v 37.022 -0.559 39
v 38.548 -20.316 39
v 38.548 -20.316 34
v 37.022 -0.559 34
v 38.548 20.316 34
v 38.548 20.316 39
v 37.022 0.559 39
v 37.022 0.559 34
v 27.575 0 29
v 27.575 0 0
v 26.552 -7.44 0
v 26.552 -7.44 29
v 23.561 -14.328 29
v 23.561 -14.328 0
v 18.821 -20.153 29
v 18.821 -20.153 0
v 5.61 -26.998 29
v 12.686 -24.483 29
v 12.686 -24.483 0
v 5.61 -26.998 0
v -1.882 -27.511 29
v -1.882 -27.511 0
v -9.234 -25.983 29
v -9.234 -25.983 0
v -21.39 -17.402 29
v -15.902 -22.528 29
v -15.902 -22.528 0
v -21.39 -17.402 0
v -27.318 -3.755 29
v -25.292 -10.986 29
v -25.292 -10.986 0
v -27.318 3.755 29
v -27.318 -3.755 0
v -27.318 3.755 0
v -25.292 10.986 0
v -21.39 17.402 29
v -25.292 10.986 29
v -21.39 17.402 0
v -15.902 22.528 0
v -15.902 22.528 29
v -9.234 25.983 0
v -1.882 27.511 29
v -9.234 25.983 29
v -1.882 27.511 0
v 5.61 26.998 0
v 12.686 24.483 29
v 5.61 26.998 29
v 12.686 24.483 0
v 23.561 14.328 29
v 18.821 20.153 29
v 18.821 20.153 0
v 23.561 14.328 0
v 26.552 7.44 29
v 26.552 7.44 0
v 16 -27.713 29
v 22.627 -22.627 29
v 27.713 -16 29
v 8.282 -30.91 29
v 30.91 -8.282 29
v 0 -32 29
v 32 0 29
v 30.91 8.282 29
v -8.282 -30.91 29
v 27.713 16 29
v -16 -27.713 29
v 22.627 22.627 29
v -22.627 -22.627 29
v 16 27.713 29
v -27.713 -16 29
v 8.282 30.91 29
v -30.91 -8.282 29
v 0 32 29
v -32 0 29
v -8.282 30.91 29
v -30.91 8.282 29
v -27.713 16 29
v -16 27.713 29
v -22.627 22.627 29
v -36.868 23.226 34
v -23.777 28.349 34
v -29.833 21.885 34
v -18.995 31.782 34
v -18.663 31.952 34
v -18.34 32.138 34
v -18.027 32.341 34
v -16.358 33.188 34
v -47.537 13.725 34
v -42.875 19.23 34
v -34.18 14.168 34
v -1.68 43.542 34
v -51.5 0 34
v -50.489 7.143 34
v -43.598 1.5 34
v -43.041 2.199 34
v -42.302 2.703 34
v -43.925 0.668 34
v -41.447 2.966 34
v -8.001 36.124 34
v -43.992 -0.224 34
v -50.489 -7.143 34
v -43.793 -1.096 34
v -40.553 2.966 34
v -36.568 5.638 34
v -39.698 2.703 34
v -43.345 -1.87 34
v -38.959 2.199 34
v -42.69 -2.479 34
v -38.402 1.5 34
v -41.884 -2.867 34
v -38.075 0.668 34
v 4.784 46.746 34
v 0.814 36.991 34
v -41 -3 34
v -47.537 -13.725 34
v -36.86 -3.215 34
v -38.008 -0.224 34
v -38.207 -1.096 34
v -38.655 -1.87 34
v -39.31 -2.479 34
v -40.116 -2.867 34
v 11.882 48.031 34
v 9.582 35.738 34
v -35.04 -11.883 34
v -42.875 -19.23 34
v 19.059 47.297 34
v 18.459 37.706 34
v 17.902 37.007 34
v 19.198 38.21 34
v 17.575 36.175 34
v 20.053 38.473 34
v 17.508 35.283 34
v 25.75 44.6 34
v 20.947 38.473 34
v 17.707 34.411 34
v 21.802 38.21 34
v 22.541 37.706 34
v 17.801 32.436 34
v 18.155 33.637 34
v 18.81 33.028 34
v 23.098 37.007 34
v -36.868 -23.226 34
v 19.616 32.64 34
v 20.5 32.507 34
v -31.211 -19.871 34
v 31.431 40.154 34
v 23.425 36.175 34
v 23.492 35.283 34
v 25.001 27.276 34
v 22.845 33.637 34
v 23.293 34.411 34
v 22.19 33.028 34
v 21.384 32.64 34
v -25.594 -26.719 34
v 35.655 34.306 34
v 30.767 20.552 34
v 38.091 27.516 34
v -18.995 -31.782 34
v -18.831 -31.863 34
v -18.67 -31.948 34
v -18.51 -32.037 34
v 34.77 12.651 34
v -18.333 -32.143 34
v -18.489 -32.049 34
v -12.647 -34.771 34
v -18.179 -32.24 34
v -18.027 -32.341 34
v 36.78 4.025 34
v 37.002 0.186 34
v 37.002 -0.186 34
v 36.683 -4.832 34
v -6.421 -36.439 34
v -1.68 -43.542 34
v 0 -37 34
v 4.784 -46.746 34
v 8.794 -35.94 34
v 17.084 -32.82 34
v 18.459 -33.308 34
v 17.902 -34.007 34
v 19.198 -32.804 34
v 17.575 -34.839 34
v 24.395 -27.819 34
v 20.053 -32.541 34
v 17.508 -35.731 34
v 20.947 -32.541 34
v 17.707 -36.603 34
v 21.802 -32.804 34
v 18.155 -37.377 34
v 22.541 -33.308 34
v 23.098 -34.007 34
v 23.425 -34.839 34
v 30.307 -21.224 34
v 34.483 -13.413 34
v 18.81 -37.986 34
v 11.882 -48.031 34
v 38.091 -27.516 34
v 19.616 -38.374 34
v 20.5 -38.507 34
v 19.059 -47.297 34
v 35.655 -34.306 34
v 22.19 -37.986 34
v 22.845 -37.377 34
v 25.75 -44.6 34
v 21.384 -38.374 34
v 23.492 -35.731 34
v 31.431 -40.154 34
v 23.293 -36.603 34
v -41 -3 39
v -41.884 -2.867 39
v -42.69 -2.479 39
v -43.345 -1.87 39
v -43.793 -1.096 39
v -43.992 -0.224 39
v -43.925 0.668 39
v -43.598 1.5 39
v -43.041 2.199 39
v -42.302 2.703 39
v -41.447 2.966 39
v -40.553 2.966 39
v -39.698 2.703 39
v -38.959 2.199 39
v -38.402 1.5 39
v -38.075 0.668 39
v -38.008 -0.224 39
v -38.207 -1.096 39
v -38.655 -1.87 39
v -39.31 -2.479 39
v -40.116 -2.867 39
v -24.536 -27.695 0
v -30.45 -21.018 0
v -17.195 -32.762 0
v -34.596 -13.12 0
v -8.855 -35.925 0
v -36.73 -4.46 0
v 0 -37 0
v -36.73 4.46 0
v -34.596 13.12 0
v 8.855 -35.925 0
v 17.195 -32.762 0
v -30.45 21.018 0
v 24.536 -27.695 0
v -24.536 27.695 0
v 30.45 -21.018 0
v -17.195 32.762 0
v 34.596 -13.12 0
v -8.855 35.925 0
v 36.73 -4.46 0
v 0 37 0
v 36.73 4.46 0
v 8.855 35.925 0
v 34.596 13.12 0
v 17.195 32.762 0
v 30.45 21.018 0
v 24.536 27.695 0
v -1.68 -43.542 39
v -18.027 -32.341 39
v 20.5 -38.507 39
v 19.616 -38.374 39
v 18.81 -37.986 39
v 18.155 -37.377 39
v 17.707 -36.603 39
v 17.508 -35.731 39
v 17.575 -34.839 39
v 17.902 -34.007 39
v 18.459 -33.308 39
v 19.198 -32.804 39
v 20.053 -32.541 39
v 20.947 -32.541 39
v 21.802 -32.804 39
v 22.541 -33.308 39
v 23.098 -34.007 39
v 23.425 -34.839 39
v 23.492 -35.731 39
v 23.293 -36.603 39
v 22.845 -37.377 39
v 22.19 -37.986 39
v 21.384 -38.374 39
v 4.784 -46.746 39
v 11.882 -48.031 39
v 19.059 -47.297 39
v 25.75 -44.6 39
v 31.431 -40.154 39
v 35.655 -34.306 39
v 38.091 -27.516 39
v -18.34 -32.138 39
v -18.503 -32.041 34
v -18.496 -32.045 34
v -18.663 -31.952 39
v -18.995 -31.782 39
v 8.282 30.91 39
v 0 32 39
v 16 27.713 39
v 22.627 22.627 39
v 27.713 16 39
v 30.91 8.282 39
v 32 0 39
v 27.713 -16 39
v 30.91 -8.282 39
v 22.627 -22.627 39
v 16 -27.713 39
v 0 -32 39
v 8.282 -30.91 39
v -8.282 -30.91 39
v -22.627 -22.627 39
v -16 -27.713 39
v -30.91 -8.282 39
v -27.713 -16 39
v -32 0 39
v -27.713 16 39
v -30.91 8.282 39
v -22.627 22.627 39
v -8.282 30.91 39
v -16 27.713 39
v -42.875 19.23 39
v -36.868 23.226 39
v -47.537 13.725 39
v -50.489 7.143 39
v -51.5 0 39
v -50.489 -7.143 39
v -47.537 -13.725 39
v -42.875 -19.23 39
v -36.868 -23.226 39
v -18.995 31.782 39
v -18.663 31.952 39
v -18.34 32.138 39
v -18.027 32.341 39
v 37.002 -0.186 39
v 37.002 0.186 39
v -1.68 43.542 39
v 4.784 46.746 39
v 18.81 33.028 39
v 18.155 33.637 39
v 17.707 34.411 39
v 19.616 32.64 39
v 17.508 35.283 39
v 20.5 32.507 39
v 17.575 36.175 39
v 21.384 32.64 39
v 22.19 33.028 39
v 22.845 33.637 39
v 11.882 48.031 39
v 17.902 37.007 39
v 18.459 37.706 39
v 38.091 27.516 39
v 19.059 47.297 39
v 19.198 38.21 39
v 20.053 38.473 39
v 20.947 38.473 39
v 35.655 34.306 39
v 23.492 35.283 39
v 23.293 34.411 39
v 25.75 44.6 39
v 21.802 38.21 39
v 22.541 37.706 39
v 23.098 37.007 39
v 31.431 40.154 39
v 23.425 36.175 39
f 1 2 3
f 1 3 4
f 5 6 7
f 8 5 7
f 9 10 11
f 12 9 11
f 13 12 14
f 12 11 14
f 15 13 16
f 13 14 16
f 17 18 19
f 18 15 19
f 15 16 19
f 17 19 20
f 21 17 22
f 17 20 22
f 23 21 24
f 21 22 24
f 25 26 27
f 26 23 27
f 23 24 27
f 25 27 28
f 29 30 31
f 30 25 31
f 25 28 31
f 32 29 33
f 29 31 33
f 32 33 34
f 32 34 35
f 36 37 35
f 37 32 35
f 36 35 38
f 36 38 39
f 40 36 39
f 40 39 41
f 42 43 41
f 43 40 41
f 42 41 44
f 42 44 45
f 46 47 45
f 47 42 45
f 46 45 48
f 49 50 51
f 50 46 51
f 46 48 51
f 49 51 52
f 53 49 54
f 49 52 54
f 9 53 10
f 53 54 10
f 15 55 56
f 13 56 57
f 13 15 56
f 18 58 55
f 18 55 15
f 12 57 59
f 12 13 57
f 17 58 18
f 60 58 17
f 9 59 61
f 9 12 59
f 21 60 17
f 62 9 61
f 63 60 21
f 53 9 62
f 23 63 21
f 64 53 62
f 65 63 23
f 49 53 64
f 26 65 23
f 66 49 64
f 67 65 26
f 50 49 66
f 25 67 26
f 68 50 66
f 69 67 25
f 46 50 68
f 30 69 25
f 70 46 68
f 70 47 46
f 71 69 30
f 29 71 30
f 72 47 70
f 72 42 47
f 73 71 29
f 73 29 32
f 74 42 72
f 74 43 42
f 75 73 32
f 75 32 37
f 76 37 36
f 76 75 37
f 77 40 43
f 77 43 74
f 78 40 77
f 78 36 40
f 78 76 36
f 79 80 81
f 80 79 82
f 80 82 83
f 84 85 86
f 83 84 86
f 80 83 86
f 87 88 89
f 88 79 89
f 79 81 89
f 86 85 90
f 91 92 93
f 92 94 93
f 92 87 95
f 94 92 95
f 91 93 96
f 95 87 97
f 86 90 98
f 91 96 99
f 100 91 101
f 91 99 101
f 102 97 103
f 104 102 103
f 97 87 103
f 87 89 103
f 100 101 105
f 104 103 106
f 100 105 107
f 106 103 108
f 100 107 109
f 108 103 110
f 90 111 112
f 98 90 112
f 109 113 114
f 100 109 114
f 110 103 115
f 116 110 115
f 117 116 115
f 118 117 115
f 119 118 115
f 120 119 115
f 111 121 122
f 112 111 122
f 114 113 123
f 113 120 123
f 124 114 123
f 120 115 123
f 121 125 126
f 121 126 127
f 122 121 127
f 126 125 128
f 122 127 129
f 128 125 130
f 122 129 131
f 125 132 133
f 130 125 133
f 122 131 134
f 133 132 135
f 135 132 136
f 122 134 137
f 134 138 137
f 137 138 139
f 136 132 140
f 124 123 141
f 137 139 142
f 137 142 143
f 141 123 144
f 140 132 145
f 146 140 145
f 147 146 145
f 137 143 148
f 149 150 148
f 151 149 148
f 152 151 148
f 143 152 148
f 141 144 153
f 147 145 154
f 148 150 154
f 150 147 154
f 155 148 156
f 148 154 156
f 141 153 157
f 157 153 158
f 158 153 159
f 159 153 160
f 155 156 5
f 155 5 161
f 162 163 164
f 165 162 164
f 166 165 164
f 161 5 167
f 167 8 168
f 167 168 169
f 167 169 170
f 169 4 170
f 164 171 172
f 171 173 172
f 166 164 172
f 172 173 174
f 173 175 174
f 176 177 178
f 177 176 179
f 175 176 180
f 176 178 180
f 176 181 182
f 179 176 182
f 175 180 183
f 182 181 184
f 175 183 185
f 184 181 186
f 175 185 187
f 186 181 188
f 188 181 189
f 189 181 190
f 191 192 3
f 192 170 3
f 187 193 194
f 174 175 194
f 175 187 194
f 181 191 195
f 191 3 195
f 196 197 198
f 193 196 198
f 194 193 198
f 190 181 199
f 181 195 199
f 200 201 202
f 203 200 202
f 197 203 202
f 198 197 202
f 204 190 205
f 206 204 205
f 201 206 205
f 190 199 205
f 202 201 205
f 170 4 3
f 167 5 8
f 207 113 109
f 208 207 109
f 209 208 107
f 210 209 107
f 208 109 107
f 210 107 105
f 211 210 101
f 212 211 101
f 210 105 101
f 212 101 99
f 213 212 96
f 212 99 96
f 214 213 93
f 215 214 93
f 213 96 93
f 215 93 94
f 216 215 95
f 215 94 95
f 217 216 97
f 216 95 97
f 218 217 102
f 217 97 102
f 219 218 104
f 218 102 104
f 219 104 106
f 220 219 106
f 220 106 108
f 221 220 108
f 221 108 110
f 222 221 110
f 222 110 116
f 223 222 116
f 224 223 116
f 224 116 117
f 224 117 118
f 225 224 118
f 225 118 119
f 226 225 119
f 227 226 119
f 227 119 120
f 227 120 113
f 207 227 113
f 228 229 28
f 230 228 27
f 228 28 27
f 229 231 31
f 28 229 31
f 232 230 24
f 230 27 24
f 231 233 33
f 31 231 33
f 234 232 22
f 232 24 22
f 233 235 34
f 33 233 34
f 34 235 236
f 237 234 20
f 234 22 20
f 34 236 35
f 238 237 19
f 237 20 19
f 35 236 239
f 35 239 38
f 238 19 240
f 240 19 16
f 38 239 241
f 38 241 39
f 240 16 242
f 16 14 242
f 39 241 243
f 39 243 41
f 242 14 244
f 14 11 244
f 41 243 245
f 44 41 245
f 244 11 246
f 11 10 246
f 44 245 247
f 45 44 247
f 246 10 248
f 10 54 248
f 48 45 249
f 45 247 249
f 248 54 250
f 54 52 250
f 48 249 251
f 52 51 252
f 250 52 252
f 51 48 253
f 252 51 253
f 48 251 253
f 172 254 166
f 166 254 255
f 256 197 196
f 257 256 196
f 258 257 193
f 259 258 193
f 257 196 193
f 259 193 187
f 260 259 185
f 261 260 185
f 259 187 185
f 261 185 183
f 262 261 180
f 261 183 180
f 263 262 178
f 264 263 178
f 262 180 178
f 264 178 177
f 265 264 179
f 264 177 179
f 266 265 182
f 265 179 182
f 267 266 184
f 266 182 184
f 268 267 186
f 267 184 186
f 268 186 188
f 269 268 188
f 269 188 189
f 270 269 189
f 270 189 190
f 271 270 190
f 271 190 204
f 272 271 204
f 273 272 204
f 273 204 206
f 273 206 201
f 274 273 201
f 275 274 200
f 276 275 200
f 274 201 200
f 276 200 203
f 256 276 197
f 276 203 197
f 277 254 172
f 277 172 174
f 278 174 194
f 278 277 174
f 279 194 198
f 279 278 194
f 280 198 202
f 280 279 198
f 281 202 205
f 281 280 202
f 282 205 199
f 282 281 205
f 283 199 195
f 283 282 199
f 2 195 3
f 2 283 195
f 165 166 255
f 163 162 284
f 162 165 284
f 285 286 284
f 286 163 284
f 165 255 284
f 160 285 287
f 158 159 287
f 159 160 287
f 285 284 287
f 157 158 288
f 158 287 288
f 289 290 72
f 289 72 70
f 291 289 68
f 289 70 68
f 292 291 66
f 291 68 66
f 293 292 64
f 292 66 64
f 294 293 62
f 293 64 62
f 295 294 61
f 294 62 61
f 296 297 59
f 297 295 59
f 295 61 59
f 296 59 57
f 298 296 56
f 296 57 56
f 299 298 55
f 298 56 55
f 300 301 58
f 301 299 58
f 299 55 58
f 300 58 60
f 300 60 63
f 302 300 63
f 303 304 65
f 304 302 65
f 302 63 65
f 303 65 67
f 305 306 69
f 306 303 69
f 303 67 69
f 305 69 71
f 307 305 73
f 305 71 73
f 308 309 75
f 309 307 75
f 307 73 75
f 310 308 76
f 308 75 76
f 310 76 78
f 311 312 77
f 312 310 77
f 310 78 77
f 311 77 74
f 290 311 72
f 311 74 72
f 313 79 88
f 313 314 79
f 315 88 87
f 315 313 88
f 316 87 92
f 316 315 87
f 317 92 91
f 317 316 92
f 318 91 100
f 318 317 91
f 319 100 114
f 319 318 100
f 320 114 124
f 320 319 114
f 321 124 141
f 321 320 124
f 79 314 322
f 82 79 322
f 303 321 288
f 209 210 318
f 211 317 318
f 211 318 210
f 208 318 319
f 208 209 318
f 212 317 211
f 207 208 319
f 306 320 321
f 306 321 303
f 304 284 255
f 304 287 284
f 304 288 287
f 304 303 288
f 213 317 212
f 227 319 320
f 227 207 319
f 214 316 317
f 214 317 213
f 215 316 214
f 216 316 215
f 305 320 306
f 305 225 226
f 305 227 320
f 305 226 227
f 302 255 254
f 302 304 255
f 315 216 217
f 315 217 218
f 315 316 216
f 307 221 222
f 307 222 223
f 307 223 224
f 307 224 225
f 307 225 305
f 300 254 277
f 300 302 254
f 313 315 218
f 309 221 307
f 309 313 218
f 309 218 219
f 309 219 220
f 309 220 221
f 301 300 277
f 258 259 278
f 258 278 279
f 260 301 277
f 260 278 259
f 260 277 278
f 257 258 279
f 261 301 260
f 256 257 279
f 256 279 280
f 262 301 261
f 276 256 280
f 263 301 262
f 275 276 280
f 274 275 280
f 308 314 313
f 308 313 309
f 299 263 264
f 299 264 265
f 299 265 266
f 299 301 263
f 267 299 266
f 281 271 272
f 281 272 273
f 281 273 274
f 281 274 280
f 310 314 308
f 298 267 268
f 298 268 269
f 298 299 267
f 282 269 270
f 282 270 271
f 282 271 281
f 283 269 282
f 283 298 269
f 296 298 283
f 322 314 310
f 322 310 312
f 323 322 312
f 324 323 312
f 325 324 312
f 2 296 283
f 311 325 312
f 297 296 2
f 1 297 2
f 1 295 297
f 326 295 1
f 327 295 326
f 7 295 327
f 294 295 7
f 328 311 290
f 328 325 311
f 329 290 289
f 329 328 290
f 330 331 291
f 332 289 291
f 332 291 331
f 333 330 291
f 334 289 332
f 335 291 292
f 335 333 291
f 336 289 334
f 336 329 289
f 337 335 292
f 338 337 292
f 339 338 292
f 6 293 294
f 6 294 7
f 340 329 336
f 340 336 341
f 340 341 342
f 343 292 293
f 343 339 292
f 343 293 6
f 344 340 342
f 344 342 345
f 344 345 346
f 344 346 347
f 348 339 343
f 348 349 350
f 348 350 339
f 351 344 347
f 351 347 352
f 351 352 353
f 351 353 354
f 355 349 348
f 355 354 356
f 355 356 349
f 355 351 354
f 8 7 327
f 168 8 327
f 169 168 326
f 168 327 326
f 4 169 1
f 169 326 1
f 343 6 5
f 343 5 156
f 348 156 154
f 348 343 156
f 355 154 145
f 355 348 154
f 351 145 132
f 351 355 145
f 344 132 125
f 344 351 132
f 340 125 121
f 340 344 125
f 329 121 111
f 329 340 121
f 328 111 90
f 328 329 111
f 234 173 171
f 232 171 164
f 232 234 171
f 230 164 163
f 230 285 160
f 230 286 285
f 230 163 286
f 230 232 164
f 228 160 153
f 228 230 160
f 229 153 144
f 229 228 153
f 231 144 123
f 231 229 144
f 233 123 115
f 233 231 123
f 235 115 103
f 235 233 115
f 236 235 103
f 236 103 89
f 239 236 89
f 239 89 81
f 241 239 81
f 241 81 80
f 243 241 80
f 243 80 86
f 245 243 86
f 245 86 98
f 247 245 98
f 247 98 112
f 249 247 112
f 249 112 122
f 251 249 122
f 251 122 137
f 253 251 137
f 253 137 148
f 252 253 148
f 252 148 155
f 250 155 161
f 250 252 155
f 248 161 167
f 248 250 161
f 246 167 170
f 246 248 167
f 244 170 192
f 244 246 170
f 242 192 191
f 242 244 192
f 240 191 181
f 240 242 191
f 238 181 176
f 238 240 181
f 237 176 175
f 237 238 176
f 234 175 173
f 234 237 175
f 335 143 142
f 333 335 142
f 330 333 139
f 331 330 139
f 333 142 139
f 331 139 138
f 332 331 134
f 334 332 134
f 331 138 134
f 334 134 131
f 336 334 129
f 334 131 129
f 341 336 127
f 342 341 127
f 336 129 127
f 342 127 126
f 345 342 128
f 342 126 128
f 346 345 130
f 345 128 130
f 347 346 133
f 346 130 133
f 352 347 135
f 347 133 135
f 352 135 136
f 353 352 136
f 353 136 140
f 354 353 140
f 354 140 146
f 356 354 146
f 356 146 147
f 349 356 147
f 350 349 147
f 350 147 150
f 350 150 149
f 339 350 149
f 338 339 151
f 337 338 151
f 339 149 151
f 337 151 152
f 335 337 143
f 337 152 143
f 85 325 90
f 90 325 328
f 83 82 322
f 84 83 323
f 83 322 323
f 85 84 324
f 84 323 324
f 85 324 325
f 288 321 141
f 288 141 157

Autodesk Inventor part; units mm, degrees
ref_plane "XZ Plane" through (0, 0, 0) normal (0, 1, 0) x (-1, 0, 0)
ref_plane "XY Plane" through (0, 0, 0) normal (0, 0, 1) x (1, 0, 0)
sketch "Sketch1" plane through (0, 0, 0) normal (0, 0, 1) x (1, 0, 0)
  circle A0 centre (0, 0) radius 27.575
  circle A1 centre (0, 0) radius 51.5
  dimension "d0" = 55.15
  dimension "d1" = 103
extrude "Extrusion1" add sketch "Sketch1" along normal blind 39
sketch "Sketch2" plane through (0, 0, 0) normal (1, 0, 0) x (0, 1, 0)
  line L0 (51.5, 39) -> (-51.5, 39) projected
  line L1 (51.5, 0) -> (-51.5, 0) projected
  line L2 (42.7787, 29) -> (-54.5799, 29) construction
  line L3 (-27.575, 39) -> (27.575, 39) projected
  line L4 (-27.575, 39) -> (27.575, 39) projected
  line L5 (-27.575, 0) -> (27.575, 0) projected
  line L6 (51.5, 0) -> (27.575, 0) projected
  line L7 (27.575, 0) -> (27.575, 39) projected
  line L8 (27.575, 39) -> (51.5, 39) projected
  line L9 (-51.5, 39) -> (-27.575, 39) projected
  line L10 (-27.575, 39) -> (-27.575, 0) projected
  line L11 (-27.575, 0) -> (-51.5, 0) projected
  line L12 (27.575, 39) -> (32, 39)
  line L13 (32, 39) -> (32, 29)
  line L14 (32, 29) -> (27.575, 29)
  line L15 (27.575, 29) -> (27.575, 39)
  line L16 (0, -7.8) -> (0, 46.8) projected
  line L17 (51.5, 39) -> (51.5, 0) projected
  line L18 (-51.5, 0) -> (-51.5, 39) projected
  point P0 (0, 0)
  dimension "d4" = 10
  dimension "d5" = 32
revolve "Revolution1" cut sketch "Sketch2" angle 360 about axis through (0, 0, -10) along (0, 0, 1) contours L13 L14 L7 L0
sketch "Sketch3" plane through (0, 0, 0) normal (1, 0, 0) x (0, 1, 0)
  line L0 (51.5, 39) -> (51.5, 0) projected
  line L1 (51.5, 0) -> (27.575, 0) projected
  line L2 (27.575, 0) -> (27.575, 29) projected
  line L3 (27.575, 29) -> (32, 29) projected
  line L4 (32, 29) -> (32, 39) projected
  line L5 (32, 39) -> (51.5, 39) projected
  line L6 (-51.5, 0) -> (-51.5, 39) projected
  line L7 (-51.5, 39) -> (-32, 39) projected
  line L8 (-32, 39) -> (-32, 29) projected
  line L9 (-32, 29) -> (-27.575, 29) projected
  line L10 (-27.575, 29) -> (-27.575, 0) projected
  line L11 (-27.575, 0) -> (-51.5, 0) projected
  line L12 (-51.5, 0) -> (-51.5, 39) projected
  line L13 (-32, 39) -> (-32, 29) projected
  line L14 (-32, 34) -> (-51.5, 34)
  line L15 (-37, 34) -> (-37, 0)
  line L16 (51.5, 0) -> (-51.5, 0) projected
  line L17 (0, -7.8) -> (0, 46.8) projected
  point P0 (0, 0)
  point P1 (-51.5, 34)
  dimension "d7" = 5
  dimension "d11" = 5
revolve "Revolution2" cut sketch "Sketch3" angle 360 about axis through (0, 0, -10) along (0, 0, 1) contours L11 L6 L14 L15
sketch "Sketch4" plane through (0, 0, 39) normal (0, 0, 1) x (1, 0, 0)
  circle A0 centre (0, 0) radius 32 projected
  circle A1 centre (0, 0) radius 51.5 projected
  circle A2 centre (0, 0) radius 32 projected
  line L0 (0, 0) -> (-55.0177, 0) construction
  line L1 (0, 0) -> (34.9883, -60.6016) construction
  line L2 (0, 0) -> (42.9469, 74.3862) construction
  circle A3 centre (-25.75, 0) radius 25.75 construction
  circle A4 centre (12.875, -22.3002) radius 25.75 construction
  circle A5 centre (0, 0) radius 51.5 projected
  circle A6 centre (12.875, 22.3002) radius 25.75 construction
  line L3 (0, 0) -> (-33.8932, -58.7048) construction
  line L4 (0, 0) -> (-35.029, 60.6721) construction
  line L5 (0, 0) -> (41.9391, 0) construction
  circle A7 centre (-22.125, -38.3216) radius 7.25 construction
  circle A8 centre (-22.125, 38.3216) radius 7.25 construction
  circle A9 centre (44.25, 0) radius 7.25 construction
  line L6 (38.5484, -20.3161) -> (37.0216, -0.5586)
  line L7 (38.5484, 20.3161) -> (37.0216, 0.5586)
  line L8 (-1.68, -43.542) -> (-18.027, -32.3409)
  line L9 (-36.8684, -23.2259) -> (-18.9946, -31.7823)
  line L10 (-36.8684, 23.2259) -> (-18.9946, 31.7823)
  line L11 (-18.027, 32.3409) -> (-1.68, 43.542)
  arc A10 (-1.68, -43.542) -> (38.5484, -20.3161) centre (12.875, -22.3002) ccw
  arc A11 (37.0216, 0.5586) -> (37.0216, -0.5586) centre (44.25, 0) ccw
  arc A12 (36.3356, 11.6859) -> (-1.68, 43.542) centre (12.875, 22.3002) ccw
  arc A13 (-18.9946, 31.7823) -> (-18.027, 32.3409) centre (-22.125, 38.3216) ccw
  arc A14 (-18.027, -32.3409) -> (-18.9946, -31.7823) centre (-22.125, -38.3216) ccw
  arc A15 (-36.8684, 23.2259) -> (-36.8684, -23.2259) centre (-25.75, 0) ccw
  circle A16 centre (0, 0) radius 37 projected
  point P0 (-51.5, 0)
  point P1 (25.75, -44.6003)
  point P2 (25.75, 44.6003)
  dimension "d12" = 120
  dimension "d13" = 120
  dimension "d14" = 120
  dimension "d15" = 120
extrude "Extrusion2" cut sketch "Sketch4" against normal up to surface (5 mm away) contours A1 A10 L6 A11 L7 A12 | A12 L11 A13 L10 A15 A1 | A1 A15 L9 A14 L8 A10
sketch "Sketch5" plane through (0, 0, 39) normal (0, 0, 1) x (1, 0, 0)
  circle A0 centre (0, 0) radius 32 projected
  line L0 (0, 0) -> (-33.178, 0) construction
  circle A1 centre (-41, 0) radius 3
  point P0 (20.5, -35.507)
  point P1 (20.5, 35.507)
  dimension "d18" = 6
  dimension "d19" = 41
  dimension "d22" = 360
hole "Hole1" at (-41, 0, 39) at (20.5, 35.507, 39) at (20.5, -35.507, 39) direction (0, 0, -1) diameter 6 end through all
equation "\"d13\" = d12"
equation "\"d14\" = d12"
equation "\"d15\" = d12"
properties part number "EDF Mount"
